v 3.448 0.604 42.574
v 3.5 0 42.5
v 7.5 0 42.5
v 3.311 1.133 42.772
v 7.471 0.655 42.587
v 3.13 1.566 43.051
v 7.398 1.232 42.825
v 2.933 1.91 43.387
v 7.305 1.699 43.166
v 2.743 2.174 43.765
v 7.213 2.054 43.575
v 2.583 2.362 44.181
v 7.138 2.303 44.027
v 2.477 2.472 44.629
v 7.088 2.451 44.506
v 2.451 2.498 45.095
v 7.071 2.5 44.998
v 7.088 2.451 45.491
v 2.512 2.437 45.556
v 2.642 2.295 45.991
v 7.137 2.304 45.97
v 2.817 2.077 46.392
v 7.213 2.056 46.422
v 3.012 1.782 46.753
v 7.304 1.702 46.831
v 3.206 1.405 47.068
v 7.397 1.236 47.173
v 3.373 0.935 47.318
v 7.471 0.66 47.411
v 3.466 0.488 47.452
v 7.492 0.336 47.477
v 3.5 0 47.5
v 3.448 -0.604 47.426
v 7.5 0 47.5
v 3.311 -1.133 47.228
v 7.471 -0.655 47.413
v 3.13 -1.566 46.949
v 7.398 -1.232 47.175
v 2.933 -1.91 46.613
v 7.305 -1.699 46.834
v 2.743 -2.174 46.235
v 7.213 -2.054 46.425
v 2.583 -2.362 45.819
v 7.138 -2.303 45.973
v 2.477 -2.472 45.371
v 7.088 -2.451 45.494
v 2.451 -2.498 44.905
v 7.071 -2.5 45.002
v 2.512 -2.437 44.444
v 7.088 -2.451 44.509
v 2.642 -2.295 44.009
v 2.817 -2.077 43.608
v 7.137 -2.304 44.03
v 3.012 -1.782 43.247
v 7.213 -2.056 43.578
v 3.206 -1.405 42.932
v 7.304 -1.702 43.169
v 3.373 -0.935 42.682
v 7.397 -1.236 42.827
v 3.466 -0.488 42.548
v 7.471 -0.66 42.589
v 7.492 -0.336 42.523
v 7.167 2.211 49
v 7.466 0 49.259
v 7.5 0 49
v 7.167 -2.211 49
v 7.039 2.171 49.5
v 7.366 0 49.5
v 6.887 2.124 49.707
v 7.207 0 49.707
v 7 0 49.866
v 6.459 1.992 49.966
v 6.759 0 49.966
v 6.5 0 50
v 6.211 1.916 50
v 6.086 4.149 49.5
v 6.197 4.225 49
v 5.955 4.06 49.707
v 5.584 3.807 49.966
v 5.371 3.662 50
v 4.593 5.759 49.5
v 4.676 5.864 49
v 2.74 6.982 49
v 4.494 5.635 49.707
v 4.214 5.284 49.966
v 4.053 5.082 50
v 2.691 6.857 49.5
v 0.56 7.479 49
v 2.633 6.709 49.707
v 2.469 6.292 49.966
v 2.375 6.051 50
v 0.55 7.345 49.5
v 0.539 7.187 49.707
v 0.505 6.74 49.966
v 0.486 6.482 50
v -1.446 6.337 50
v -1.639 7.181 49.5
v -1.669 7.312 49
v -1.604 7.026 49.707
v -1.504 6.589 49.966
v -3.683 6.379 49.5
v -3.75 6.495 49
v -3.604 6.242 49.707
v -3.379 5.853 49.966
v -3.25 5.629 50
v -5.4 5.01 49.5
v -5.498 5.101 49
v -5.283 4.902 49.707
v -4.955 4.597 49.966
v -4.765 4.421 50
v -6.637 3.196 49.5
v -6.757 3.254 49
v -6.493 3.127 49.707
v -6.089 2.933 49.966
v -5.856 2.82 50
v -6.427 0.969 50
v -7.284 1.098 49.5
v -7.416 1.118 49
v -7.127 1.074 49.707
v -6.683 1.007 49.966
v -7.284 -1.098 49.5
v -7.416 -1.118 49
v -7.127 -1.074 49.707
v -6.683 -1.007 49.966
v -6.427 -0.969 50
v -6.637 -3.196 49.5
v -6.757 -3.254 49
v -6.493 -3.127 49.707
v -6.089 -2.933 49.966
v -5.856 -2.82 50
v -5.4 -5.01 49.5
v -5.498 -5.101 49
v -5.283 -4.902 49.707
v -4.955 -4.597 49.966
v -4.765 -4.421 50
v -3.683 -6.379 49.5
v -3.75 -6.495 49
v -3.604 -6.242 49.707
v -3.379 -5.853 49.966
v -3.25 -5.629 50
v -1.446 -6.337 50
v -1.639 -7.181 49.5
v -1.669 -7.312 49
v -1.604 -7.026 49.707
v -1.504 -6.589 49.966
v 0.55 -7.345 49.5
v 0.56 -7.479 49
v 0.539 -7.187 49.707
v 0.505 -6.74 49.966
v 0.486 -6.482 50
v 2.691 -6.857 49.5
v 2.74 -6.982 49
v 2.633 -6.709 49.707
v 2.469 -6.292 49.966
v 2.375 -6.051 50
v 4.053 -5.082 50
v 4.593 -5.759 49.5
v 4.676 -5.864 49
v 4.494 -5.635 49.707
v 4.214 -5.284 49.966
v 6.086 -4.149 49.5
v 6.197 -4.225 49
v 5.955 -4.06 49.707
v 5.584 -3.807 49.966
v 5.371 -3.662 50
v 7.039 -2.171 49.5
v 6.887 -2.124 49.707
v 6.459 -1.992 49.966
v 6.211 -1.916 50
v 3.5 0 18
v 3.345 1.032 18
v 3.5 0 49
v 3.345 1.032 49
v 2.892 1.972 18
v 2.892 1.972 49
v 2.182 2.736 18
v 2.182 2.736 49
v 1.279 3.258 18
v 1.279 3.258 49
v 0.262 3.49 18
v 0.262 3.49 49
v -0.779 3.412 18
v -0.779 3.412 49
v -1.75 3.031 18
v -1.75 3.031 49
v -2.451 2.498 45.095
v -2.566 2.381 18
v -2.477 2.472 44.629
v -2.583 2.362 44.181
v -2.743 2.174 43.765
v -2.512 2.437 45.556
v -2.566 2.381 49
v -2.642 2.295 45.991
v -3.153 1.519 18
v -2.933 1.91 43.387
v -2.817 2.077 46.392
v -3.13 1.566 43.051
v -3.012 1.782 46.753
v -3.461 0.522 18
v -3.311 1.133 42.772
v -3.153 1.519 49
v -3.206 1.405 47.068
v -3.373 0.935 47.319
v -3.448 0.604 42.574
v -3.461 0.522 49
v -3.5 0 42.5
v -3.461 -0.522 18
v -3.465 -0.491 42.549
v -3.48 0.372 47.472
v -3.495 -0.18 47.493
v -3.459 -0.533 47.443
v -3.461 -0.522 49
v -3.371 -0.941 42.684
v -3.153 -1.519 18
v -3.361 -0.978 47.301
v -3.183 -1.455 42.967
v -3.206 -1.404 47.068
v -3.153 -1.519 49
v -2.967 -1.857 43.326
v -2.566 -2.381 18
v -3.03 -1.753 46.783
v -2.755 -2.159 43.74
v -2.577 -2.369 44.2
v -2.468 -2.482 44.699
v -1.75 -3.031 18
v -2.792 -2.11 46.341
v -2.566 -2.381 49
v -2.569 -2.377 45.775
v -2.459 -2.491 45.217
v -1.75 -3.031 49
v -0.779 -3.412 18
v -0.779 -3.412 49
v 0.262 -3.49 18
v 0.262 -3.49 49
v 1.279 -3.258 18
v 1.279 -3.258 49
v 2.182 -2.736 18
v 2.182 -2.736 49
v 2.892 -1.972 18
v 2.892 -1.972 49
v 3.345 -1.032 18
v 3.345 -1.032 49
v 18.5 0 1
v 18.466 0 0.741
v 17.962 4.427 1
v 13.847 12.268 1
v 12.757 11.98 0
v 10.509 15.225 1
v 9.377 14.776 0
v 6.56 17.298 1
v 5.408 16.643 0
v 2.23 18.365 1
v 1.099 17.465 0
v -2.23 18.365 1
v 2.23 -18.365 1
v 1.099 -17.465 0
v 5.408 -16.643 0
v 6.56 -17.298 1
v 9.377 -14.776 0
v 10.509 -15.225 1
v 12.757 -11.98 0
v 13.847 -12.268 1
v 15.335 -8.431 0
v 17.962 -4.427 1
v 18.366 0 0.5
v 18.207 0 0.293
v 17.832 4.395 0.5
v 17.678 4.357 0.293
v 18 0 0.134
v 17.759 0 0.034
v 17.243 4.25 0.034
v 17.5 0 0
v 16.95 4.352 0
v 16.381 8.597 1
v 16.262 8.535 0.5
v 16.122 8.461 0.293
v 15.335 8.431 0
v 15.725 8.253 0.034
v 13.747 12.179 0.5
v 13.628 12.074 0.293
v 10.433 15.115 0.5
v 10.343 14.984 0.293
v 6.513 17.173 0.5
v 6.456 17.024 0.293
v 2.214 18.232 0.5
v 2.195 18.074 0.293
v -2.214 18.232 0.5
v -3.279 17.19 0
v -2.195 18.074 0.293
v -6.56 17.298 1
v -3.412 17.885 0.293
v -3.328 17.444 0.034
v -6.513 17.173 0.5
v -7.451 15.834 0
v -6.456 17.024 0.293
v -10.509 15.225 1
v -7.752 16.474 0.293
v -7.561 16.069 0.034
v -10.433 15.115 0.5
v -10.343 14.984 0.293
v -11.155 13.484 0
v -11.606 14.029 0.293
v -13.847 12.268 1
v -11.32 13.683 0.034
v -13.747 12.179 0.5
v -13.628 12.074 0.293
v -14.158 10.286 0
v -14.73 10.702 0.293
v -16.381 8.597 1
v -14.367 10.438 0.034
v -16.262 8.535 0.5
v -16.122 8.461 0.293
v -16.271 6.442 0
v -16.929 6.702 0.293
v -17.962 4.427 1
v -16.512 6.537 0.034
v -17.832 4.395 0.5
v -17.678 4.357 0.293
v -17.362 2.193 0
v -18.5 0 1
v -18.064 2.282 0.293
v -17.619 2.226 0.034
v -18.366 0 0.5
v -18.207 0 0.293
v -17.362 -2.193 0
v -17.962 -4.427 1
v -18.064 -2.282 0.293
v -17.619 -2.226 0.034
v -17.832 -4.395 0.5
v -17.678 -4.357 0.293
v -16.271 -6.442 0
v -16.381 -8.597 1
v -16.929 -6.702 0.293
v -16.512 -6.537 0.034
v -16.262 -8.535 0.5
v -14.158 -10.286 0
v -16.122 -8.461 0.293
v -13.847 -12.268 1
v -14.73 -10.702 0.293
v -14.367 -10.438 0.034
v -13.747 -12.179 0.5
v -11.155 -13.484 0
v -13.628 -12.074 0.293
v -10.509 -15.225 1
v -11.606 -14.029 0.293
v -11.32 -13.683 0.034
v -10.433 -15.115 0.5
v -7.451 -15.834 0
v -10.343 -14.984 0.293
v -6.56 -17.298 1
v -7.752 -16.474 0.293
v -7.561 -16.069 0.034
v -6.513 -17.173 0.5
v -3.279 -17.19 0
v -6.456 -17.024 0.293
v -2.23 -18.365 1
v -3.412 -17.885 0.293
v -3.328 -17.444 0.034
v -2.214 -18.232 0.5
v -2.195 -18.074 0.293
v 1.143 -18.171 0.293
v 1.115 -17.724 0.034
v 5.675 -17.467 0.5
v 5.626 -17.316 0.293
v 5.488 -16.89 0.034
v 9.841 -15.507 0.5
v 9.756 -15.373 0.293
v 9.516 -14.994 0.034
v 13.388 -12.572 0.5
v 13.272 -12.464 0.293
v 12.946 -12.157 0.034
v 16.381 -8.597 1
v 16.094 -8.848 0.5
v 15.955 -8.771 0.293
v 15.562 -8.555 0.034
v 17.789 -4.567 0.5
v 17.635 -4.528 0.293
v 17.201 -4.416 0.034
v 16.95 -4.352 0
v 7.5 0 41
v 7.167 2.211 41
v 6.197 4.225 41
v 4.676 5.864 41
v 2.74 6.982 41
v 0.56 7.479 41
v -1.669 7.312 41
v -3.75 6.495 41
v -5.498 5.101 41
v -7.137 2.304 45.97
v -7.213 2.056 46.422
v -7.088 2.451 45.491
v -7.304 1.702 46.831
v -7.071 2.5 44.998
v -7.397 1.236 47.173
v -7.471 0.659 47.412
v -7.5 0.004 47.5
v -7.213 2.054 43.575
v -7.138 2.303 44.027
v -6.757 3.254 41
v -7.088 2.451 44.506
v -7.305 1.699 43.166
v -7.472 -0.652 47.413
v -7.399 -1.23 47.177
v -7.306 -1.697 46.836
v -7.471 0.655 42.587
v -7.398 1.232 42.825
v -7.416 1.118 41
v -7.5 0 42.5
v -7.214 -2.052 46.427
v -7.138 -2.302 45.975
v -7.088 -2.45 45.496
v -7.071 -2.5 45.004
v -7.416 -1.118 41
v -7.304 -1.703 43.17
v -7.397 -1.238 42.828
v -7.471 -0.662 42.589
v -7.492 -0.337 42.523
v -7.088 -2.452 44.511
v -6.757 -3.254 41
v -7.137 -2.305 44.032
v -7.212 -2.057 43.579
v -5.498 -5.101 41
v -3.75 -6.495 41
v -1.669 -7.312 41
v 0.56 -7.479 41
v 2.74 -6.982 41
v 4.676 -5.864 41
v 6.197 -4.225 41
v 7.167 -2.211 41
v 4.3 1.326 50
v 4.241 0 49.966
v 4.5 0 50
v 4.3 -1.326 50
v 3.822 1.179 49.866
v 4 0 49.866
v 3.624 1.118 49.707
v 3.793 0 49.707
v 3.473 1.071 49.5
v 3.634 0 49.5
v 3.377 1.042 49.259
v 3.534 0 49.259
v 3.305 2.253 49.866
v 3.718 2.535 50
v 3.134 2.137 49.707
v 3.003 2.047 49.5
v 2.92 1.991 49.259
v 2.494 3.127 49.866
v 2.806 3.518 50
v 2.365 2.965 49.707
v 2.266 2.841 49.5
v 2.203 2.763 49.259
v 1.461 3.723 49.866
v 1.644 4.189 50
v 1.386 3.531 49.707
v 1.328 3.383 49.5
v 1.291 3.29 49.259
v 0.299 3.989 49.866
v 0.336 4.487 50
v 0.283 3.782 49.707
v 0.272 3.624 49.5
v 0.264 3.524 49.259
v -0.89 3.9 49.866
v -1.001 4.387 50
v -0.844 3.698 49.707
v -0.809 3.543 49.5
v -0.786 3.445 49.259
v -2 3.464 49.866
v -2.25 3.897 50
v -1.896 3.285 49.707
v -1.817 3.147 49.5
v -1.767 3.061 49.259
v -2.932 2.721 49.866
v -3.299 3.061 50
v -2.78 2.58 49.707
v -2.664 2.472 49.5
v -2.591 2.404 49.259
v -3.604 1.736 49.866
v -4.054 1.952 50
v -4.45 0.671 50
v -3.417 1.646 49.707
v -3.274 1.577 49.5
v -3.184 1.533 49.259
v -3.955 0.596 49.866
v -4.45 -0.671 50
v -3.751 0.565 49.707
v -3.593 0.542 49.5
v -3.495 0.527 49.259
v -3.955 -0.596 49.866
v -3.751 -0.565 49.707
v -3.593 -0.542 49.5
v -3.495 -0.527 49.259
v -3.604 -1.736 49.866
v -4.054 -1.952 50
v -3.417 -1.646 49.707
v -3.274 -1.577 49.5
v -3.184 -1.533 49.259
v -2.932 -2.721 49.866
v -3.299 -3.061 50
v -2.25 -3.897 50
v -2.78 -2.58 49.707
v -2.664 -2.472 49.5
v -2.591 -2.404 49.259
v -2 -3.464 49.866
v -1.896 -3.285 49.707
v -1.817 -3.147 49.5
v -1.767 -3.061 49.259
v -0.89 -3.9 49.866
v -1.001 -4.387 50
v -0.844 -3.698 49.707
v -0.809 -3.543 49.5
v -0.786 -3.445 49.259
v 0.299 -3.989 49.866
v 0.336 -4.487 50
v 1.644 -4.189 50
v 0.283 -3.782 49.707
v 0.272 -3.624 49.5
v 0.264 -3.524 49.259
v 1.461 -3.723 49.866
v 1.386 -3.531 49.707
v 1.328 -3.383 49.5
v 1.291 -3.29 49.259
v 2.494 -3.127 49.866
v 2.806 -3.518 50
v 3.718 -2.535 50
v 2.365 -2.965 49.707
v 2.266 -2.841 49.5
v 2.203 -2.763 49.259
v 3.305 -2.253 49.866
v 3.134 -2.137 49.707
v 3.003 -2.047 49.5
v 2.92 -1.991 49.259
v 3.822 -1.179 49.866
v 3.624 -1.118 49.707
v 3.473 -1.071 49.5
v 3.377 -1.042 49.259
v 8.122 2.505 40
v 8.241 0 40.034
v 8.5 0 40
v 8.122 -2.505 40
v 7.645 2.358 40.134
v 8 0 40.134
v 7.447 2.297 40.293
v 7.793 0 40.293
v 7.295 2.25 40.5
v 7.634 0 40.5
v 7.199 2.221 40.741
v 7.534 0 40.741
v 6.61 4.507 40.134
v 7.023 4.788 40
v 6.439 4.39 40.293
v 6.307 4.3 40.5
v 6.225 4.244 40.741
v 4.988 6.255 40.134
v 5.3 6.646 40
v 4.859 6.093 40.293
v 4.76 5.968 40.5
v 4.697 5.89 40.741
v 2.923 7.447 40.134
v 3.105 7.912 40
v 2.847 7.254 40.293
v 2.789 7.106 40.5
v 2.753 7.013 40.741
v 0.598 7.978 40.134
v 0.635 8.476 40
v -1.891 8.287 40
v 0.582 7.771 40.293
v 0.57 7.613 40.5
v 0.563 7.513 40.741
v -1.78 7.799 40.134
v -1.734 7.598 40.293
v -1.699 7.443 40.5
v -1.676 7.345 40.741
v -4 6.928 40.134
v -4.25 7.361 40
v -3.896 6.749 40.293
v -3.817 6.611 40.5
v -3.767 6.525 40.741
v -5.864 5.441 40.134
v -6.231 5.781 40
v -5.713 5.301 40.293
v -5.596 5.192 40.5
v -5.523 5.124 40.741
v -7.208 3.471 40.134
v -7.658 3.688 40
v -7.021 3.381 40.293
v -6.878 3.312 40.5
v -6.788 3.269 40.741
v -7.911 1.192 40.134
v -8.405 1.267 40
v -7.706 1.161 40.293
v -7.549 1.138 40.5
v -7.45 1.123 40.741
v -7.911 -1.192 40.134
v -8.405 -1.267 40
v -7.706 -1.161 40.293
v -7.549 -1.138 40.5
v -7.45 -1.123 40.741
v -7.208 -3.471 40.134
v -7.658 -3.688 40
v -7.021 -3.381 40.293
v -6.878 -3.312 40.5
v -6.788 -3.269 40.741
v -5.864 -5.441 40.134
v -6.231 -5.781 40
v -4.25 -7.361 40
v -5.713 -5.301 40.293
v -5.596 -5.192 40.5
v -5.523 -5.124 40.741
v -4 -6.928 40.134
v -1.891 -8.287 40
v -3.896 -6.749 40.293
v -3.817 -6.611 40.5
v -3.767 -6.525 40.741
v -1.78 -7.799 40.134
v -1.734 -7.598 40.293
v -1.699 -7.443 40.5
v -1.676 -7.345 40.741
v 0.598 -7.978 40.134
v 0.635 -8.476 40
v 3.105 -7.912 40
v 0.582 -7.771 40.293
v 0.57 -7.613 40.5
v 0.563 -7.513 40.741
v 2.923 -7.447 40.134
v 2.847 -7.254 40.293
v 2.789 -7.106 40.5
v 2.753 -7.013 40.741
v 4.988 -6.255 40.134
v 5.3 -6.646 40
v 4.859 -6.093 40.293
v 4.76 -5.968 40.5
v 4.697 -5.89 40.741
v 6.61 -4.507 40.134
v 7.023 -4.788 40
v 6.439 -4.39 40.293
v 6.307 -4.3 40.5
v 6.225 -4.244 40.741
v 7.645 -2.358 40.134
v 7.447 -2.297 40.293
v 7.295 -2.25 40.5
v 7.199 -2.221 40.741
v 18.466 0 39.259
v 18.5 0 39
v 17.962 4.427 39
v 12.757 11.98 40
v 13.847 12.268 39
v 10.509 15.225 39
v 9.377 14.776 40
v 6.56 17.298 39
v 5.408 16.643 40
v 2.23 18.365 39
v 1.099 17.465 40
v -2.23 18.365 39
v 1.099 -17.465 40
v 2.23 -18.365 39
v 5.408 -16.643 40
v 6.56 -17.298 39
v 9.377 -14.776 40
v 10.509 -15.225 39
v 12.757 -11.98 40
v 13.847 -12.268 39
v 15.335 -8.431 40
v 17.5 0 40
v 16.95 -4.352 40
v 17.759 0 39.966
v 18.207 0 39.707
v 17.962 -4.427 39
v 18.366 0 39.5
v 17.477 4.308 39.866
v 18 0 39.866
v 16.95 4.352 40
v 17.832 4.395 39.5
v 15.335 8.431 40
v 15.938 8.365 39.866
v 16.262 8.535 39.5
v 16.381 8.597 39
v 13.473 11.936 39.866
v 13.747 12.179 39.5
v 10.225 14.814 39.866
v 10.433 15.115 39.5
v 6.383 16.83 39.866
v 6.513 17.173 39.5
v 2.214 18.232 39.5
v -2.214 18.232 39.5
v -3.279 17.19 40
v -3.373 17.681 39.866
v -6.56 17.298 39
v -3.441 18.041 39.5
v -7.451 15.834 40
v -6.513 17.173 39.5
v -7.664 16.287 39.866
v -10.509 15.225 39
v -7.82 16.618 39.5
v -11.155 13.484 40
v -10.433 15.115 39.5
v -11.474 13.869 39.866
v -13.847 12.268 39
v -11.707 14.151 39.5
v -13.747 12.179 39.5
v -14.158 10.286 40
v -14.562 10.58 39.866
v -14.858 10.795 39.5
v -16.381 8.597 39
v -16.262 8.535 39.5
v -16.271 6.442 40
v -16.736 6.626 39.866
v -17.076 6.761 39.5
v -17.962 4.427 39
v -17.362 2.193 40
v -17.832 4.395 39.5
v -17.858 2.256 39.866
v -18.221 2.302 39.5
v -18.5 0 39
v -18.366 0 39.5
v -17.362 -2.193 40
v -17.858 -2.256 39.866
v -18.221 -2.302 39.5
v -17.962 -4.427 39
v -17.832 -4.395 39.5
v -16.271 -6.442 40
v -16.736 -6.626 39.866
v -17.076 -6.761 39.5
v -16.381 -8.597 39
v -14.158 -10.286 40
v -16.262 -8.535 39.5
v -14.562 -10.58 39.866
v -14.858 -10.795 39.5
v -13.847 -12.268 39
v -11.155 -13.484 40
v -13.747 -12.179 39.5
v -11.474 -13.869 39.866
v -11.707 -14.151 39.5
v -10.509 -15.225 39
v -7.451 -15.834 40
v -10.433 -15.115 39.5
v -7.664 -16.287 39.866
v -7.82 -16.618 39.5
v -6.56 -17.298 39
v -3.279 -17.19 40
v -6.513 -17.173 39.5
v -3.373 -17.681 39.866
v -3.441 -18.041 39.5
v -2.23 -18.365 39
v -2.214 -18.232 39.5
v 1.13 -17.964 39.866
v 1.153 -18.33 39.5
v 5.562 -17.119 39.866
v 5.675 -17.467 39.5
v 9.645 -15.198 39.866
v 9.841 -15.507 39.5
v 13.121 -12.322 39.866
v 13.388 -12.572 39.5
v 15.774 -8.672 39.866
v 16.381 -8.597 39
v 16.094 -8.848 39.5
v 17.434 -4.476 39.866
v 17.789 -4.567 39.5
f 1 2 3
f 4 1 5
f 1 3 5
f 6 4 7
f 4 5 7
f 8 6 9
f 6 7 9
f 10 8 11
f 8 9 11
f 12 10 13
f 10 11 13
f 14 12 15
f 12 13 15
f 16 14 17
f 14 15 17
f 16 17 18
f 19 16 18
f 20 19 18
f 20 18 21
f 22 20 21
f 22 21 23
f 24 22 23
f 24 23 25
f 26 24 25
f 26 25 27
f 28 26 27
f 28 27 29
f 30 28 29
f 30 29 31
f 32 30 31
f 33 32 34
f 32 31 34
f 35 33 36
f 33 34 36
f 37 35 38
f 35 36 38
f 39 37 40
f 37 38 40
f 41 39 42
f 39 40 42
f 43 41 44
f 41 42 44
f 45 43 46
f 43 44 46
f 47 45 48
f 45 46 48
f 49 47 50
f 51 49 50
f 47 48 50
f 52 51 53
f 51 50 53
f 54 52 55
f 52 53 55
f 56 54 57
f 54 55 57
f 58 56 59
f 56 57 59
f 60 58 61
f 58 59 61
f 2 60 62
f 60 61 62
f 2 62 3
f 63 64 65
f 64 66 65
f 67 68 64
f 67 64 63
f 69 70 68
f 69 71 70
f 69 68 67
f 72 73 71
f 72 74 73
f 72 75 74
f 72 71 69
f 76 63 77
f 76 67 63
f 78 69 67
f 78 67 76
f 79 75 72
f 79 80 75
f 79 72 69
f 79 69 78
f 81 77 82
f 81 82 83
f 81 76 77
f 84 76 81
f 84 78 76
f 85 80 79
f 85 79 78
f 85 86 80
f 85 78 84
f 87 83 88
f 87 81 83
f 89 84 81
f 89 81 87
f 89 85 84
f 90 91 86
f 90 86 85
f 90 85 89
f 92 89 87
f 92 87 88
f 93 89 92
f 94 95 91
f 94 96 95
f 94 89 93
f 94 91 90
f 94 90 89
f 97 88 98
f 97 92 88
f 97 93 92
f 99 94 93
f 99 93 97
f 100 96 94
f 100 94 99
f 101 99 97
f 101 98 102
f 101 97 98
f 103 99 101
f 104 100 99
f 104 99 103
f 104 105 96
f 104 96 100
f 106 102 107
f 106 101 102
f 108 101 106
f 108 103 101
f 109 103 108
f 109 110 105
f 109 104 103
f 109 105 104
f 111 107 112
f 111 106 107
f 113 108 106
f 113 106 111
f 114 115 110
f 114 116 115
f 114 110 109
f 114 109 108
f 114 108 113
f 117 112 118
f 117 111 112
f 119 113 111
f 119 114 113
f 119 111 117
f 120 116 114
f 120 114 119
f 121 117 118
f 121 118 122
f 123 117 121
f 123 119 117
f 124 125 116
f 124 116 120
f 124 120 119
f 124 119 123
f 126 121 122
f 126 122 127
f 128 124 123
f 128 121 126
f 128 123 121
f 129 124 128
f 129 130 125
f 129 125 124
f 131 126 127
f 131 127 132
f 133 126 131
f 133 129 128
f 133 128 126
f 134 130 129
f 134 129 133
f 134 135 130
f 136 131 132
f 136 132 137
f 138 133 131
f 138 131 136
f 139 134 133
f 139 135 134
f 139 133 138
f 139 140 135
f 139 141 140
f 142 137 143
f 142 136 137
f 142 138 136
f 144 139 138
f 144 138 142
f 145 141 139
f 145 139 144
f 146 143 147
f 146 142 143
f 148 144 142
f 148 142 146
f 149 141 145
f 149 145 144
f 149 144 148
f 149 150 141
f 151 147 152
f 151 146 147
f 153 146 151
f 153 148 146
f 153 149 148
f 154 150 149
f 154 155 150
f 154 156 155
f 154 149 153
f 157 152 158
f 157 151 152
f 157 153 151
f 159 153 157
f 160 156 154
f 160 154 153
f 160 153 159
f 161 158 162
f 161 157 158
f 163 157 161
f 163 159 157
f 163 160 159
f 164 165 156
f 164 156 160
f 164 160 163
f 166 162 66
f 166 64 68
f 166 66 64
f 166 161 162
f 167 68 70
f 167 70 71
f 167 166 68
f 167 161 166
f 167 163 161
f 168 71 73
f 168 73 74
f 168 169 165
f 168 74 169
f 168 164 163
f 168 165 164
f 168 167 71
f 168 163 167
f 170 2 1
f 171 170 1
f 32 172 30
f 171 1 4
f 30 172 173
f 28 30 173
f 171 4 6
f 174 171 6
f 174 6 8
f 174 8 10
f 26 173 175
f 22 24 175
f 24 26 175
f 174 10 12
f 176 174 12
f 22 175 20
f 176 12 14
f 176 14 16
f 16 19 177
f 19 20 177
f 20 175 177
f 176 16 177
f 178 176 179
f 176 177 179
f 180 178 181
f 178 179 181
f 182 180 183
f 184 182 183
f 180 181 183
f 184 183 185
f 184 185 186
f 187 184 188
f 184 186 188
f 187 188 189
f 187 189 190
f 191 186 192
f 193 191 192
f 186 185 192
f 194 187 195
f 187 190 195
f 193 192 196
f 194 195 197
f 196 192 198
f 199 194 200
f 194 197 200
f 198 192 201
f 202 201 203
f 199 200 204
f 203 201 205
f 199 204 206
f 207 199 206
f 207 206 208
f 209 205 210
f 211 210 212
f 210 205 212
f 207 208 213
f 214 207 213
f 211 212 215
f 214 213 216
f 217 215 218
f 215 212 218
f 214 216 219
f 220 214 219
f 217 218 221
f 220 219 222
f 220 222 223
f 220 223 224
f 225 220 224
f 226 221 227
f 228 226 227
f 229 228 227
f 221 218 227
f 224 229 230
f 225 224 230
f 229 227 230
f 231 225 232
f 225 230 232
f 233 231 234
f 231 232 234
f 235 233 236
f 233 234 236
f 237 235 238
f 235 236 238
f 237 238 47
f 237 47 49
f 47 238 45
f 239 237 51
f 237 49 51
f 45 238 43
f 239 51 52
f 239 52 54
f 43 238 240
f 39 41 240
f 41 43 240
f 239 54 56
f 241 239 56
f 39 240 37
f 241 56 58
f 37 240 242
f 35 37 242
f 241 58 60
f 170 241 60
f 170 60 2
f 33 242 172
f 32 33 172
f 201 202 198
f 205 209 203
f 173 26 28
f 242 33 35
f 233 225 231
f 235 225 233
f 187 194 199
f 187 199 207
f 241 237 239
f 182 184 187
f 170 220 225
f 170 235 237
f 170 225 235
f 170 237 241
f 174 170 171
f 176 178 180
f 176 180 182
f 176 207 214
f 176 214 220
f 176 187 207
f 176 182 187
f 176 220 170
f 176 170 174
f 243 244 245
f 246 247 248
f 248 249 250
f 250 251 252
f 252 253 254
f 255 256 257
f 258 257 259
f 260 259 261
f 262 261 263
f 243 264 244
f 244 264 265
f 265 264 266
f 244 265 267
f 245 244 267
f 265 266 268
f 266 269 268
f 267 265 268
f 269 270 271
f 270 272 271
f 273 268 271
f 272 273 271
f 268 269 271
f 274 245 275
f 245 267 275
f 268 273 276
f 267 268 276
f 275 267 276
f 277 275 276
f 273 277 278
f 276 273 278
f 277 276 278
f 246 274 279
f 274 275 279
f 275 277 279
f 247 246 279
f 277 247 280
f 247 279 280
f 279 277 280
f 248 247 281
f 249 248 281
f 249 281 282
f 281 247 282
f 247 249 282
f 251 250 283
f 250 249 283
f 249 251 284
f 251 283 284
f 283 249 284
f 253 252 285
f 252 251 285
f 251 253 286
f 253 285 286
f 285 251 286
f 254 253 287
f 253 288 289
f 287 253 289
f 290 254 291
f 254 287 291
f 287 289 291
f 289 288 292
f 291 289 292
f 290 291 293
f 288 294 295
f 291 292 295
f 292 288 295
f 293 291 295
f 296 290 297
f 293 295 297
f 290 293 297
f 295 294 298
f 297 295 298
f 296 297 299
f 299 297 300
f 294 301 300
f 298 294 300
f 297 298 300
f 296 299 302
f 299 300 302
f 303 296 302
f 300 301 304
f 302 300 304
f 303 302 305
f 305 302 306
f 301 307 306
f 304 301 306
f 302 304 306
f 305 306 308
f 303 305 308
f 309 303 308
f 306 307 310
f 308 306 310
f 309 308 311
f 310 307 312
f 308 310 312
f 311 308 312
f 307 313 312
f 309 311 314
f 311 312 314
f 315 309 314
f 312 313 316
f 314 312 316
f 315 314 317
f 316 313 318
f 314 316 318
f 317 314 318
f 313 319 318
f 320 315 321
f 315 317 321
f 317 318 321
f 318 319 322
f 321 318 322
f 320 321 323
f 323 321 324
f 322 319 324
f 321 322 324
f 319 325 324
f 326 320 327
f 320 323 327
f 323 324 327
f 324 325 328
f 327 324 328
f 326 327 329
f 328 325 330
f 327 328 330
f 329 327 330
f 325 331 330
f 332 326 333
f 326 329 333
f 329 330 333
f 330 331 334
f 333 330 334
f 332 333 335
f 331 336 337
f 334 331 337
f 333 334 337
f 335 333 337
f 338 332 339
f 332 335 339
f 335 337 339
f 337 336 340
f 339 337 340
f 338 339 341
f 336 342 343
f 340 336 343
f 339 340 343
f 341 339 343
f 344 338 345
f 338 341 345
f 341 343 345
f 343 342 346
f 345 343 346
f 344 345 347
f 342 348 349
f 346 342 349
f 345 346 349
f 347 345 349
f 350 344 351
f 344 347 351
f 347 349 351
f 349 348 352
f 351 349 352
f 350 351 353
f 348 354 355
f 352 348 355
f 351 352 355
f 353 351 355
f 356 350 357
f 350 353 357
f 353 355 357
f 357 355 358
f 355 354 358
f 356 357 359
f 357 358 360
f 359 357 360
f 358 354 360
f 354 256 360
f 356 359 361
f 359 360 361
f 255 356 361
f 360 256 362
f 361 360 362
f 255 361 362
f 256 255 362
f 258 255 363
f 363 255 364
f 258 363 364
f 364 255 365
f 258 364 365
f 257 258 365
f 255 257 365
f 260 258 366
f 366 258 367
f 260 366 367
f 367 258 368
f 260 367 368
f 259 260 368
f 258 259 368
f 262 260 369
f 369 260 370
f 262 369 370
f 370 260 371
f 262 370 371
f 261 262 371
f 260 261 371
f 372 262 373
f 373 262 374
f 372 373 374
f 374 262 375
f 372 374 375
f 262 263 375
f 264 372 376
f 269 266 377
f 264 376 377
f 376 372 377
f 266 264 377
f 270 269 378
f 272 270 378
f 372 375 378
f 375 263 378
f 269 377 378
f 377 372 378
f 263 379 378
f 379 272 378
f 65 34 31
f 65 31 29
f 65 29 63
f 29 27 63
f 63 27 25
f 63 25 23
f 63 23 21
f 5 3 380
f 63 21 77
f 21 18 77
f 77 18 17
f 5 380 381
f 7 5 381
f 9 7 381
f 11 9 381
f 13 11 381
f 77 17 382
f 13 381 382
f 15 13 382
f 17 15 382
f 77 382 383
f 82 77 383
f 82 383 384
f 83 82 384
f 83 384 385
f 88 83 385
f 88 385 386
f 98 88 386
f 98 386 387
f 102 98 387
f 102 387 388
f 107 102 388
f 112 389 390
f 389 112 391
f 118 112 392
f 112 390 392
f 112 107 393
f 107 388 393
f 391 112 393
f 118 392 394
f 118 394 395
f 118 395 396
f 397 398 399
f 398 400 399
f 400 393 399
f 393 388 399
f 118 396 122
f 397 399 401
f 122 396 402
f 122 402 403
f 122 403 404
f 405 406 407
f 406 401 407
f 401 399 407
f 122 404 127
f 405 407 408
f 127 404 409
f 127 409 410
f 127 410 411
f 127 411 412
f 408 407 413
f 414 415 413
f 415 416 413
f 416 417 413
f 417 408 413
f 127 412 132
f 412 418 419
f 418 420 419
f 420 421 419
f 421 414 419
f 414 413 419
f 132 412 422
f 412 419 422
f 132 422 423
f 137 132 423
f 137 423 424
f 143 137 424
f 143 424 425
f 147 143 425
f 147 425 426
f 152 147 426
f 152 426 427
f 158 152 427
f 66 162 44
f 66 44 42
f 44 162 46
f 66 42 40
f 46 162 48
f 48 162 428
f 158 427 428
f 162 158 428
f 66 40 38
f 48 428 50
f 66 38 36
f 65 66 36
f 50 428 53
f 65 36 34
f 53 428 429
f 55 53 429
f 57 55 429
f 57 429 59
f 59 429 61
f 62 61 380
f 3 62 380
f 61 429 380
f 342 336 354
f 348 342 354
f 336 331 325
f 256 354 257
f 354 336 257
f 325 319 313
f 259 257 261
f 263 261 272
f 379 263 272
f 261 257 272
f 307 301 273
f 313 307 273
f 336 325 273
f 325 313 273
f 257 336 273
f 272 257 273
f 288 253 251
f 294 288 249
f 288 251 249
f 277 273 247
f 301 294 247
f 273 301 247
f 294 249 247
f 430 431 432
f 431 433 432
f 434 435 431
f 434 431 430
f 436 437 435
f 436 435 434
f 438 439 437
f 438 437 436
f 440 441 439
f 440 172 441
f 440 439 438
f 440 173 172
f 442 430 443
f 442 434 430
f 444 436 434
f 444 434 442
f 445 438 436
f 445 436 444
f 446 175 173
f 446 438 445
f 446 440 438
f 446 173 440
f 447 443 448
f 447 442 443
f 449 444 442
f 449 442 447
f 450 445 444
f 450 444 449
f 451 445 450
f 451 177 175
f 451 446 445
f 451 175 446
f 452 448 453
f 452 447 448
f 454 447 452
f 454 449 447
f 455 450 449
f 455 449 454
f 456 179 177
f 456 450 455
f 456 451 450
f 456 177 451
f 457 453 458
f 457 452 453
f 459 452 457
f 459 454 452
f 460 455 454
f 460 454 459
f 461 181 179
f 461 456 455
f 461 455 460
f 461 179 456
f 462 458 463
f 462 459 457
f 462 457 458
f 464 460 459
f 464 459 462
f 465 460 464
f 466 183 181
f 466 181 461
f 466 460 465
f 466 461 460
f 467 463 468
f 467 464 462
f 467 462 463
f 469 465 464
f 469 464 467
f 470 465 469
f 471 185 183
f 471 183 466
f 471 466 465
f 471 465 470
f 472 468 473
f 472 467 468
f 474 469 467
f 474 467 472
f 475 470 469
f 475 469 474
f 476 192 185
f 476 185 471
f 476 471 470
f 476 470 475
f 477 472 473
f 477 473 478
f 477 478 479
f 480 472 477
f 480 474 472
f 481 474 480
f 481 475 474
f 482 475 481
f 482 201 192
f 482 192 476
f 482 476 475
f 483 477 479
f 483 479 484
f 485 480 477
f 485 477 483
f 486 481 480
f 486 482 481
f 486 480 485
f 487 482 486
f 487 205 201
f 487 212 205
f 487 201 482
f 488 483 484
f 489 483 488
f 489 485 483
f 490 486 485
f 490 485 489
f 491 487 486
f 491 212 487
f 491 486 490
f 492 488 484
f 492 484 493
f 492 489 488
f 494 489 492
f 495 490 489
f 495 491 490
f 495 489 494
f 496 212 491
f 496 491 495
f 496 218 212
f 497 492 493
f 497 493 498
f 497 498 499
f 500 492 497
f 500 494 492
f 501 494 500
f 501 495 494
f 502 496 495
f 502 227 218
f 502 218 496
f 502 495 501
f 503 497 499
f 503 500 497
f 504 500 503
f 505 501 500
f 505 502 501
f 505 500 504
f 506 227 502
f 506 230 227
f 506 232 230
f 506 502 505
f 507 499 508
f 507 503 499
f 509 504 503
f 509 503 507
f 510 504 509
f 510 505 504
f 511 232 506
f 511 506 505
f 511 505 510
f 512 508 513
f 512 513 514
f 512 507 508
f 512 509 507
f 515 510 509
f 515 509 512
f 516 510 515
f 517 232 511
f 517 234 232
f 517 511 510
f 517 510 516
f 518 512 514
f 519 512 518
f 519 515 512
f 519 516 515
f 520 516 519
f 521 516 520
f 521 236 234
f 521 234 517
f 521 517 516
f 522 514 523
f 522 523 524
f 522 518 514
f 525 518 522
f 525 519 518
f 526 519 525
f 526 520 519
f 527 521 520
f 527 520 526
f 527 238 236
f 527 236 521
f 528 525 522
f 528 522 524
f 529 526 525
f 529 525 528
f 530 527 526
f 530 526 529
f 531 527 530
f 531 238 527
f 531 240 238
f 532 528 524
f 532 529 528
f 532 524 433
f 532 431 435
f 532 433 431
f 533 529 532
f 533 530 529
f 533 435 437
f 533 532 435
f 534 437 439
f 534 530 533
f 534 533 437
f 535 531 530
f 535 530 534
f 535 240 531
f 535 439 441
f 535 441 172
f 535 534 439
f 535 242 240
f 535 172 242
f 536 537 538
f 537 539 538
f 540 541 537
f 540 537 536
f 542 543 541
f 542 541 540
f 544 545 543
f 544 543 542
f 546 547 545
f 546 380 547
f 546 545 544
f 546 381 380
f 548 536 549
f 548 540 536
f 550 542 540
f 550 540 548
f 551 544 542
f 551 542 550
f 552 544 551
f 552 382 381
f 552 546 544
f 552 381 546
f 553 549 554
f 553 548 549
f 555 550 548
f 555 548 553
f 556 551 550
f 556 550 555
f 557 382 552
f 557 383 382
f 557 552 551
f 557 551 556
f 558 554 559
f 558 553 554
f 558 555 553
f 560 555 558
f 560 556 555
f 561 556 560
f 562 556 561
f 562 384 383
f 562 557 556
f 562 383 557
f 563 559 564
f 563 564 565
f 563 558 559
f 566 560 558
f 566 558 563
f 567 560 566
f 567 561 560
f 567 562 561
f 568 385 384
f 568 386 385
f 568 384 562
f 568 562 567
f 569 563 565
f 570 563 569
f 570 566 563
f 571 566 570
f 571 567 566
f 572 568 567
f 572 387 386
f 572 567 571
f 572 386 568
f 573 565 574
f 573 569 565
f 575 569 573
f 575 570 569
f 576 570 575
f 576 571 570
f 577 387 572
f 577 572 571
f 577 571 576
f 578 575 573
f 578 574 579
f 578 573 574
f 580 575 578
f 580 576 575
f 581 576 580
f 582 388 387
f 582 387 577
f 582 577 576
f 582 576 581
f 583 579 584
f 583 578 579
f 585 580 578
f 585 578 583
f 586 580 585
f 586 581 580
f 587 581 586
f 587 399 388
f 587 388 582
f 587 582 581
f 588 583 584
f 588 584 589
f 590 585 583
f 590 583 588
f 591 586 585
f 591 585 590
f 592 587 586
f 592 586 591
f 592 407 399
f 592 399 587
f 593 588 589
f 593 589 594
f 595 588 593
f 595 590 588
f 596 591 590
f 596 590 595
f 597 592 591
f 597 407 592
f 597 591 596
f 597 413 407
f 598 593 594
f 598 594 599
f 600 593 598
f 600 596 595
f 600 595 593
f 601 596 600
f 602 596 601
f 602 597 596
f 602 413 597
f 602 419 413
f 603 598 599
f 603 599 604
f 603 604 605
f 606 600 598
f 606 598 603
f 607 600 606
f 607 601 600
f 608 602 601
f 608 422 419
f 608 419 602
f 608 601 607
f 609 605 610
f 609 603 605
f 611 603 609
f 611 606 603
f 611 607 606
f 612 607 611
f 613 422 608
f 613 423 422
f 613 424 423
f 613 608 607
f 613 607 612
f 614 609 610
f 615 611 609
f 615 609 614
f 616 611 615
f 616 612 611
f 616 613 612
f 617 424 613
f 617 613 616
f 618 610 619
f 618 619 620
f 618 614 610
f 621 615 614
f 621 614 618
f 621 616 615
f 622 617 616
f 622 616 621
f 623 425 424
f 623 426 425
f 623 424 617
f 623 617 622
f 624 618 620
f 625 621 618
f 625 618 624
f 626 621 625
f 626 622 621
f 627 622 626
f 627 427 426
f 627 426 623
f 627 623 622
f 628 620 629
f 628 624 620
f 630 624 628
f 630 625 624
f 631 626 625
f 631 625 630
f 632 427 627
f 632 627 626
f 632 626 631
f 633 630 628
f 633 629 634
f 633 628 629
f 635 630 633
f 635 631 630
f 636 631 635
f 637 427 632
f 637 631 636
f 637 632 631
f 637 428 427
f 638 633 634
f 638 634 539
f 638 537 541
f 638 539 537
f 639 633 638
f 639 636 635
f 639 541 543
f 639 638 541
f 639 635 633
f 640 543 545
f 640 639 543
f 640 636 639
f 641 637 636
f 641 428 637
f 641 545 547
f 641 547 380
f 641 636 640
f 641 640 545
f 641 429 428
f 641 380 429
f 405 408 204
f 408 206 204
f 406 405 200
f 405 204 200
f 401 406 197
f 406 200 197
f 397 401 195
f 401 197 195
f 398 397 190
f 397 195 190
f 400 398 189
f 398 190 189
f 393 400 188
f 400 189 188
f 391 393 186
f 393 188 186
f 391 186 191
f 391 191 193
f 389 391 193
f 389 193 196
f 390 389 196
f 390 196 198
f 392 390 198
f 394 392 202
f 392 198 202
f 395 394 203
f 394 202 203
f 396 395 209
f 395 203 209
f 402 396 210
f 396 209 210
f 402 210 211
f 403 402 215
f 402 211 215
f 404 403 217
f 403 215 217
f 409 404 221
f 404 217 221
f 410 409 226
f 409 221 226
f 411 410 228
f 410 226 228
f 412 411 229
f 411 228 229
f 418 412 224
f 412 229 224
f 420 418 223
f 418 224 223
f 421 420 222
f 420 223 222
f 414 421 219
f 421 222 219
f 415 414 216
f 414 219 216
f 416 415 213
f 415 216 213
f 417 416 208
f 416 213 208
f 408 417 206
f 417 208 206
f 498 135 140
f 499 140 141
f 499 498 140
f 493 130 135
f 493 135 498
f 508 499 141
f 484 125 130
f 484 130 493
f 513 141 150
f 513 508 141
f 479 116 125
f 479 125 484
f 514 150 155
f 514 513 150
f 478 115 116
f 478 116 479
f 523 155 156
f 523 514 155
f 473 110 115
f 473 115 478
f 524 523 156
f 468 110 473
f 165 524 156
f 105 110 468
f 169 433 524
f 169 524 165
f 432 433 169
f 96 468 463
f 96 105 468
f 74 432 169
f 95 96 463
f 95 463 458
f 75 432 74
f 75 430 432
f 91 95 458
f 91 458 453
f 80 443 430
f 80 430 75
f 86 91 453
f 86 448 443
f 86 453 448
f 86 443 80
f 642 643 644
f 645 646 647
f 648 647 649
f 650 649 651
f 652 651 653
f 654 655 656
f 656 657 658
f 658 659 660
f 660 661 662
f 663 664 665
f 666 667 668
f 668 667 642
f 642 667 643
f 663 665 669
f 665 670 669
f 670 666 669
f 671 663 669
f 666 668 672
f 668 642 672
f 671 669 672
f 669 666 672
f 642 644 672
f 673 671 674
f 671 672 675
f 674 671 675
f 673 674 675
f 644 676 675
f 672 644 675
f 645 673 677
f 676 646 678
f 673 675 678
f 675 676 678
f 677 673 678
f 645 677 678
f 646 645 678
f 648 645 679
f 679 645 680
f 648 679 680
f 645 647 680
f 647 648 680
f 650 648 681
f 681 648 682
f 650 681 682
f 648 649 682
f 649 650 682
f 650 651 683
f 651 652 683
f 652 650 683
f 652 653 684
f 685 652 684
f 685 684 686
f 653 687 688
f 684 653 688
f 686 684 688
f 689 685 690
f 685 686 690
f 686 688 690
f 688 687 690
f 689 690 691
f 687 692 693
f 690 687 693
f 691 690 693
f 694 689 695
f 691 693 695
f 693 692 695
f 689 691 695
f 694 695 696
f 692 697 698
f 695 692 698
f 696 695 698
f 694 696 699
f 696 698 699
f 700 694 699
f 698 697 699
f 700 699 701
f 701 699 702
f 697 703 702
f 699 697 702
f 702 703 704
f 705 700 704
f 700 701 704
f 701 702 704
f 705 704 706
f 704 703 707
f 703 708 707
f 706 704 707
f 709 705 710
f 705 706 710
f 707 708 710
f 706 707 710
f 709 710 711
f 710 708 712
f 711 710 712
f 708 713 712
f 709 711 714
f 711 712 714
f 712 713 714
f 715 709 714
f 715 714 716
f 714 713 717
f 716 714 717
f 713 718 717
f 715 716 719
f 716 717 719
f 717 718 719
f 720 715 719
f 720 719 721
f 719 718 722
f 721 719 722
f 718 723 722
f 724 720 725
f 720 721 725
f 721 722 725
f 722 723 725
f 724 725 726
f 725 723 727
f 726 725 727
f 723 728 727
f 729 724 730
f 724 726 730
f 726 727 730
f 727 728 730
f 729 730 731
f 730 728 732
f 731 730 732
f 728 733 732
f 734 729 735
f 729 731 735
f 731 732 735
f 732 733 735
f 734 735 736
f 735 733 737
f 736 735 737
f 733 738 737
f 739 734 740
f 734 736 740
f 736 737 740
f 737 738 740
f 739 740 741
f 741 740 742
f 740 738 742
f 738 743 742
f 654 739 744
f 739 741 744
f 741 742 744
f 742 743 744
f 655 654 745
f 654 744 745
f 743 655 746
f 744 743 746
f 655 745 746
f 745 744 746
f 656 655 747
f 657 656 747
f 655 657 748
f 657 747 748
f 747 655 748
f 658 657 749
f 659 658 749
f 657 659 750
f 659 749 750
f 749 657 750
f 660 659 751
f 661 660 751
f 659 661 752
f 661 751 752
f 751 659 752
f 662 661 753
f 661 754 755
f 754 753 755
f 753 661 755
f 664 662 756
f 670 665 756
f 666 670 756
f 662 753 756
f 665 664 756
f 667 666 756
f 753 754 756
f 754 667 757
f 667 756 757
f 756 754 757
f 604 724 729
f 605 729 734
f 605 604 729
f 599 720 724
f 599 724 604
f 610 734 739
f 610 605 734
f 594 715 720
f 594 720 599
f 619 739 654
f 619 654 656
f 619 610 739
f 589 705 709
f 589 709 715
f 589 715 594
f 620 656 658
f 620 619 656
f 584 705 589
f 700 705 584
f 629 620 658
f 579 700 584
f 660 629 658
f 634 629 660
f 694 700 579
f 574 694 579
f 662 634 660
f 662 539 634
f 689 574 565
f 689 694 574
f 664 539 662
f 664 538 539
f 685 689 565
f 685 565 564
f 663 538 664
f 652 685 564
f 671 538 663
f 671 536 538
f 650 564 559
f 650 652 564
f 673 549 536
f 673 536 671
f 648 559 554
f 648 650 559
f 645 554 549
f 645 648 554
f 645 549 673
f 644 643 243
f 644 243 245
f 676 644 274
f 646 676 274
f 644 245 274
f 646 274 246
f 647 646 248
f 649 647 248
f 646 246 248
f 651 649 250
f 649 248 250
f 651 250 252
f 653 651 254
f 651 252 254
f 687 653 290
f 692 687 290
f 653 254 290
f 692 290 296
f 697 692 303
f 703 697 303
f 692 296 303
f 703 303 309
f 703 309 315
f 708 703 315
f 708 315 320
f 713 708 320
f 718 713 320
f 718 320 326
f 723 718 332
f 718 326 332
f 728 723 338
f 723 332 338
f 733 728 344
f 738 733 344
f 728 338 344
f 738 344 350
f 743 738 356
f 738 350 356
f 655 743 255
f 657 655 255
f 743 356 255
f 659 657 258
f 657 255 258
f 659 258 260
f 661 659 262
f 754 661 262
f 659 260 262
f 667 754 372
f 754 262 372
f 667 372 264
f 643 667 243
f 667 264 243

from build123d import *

# Parameters (mm, degrees)
SKETCH1_R           = 18.5
BOSS_EXTRUDE1_DEPTH = 40
SKETCH2_R           = 7.5
BOSS_EXTRUDE2_DEPTH = 10
SKETCH3_R           = 3.5
CUT_EXTRUDE1_DEPTH  = 32
FILLET1_R           = 1
FILLET2_R           = 1
FILLET3_R           = 1
FILLET4_R           = 1
FILLET6_R           = 1
SKETCH4_R           = 2.5
CUT_EXTRUDE2_DEPTH  = 141


with BuildPart() as part:
    # Sketch1 → Boss-Extrude1 (new body)
    with BuildSketch(Plane.XY):
        Circle(SKETCH1_R)
    extrude(amount=BOSS_EXTRUDE1_DEPTH)

    # Sketch2 → Boss-Extrude2 (add)
    with BuildSketch(Plane.XY.offset(40)):
        Circle(SKETCH2_R)
    extrude(amount=BOSS_EXTRUDE2_DEPTH)

    # Sketch3 → Cut-Extrude1 (cut)
    with BuildSketch(Plane.XY.offset(50)):
        Circle(SKETCH3_R)
    extrude(amount=-CUT_EXTRUDE1_DEPTH, mode=Mode.SUBTRACT)

    # Fillet1
    fillet1_edges = [part.edges().sort_by_distance(p)[0] for p in [
        (-7.5, 0, 50),
    ]]
    fillet(fillet1_edges, radius=FILLET1_R)

    # Fillet2
    fillet2_edges = [part.edges().sort_by_distance(p)[0] for p in [
        (-18.5, 0, 40),
    ]]
    fillet(fillet2_edges, radius=FILLET2_R)

    # Fillet3
    fillet3_edges = [part.edges().sort_by_distance(p)[0] for p in [
        (-7.5, 0, 40),
    ]]
    fillet(fillet3_edges, radius=FILLET3_R)

    # Fillet4
    fillet4_edges = [part.edges().sort_by_distance(p)[0] for p in [
        (-18.5, 0, 0),
    ]]
    fillet(fillet4_edges, radius=FILLET4_R)

    # Fillet6
    fillet6_edges = [part.edges().sort_by_distance(p)[0] for p in [
        (-3.5, 0, 50),
    ]]
    fillet(fillet6_edges, radius=FILLET6_R)

    # Sketch4 → Cut-Extrude2 (cut, symmetric)
    with BuildSketch(Plane(origin=(0, 0, 0), x_dir=(0, 0, -1), z_dir=(1, 0, 0))):
        with Locations((-45, 0)):
            Circle(SKETCH4_R)
    extrude(amount=CUT_EXTRUDE2_DEPTH, both=True, mode=Mode.SUBTRACT)


solid = part.part
